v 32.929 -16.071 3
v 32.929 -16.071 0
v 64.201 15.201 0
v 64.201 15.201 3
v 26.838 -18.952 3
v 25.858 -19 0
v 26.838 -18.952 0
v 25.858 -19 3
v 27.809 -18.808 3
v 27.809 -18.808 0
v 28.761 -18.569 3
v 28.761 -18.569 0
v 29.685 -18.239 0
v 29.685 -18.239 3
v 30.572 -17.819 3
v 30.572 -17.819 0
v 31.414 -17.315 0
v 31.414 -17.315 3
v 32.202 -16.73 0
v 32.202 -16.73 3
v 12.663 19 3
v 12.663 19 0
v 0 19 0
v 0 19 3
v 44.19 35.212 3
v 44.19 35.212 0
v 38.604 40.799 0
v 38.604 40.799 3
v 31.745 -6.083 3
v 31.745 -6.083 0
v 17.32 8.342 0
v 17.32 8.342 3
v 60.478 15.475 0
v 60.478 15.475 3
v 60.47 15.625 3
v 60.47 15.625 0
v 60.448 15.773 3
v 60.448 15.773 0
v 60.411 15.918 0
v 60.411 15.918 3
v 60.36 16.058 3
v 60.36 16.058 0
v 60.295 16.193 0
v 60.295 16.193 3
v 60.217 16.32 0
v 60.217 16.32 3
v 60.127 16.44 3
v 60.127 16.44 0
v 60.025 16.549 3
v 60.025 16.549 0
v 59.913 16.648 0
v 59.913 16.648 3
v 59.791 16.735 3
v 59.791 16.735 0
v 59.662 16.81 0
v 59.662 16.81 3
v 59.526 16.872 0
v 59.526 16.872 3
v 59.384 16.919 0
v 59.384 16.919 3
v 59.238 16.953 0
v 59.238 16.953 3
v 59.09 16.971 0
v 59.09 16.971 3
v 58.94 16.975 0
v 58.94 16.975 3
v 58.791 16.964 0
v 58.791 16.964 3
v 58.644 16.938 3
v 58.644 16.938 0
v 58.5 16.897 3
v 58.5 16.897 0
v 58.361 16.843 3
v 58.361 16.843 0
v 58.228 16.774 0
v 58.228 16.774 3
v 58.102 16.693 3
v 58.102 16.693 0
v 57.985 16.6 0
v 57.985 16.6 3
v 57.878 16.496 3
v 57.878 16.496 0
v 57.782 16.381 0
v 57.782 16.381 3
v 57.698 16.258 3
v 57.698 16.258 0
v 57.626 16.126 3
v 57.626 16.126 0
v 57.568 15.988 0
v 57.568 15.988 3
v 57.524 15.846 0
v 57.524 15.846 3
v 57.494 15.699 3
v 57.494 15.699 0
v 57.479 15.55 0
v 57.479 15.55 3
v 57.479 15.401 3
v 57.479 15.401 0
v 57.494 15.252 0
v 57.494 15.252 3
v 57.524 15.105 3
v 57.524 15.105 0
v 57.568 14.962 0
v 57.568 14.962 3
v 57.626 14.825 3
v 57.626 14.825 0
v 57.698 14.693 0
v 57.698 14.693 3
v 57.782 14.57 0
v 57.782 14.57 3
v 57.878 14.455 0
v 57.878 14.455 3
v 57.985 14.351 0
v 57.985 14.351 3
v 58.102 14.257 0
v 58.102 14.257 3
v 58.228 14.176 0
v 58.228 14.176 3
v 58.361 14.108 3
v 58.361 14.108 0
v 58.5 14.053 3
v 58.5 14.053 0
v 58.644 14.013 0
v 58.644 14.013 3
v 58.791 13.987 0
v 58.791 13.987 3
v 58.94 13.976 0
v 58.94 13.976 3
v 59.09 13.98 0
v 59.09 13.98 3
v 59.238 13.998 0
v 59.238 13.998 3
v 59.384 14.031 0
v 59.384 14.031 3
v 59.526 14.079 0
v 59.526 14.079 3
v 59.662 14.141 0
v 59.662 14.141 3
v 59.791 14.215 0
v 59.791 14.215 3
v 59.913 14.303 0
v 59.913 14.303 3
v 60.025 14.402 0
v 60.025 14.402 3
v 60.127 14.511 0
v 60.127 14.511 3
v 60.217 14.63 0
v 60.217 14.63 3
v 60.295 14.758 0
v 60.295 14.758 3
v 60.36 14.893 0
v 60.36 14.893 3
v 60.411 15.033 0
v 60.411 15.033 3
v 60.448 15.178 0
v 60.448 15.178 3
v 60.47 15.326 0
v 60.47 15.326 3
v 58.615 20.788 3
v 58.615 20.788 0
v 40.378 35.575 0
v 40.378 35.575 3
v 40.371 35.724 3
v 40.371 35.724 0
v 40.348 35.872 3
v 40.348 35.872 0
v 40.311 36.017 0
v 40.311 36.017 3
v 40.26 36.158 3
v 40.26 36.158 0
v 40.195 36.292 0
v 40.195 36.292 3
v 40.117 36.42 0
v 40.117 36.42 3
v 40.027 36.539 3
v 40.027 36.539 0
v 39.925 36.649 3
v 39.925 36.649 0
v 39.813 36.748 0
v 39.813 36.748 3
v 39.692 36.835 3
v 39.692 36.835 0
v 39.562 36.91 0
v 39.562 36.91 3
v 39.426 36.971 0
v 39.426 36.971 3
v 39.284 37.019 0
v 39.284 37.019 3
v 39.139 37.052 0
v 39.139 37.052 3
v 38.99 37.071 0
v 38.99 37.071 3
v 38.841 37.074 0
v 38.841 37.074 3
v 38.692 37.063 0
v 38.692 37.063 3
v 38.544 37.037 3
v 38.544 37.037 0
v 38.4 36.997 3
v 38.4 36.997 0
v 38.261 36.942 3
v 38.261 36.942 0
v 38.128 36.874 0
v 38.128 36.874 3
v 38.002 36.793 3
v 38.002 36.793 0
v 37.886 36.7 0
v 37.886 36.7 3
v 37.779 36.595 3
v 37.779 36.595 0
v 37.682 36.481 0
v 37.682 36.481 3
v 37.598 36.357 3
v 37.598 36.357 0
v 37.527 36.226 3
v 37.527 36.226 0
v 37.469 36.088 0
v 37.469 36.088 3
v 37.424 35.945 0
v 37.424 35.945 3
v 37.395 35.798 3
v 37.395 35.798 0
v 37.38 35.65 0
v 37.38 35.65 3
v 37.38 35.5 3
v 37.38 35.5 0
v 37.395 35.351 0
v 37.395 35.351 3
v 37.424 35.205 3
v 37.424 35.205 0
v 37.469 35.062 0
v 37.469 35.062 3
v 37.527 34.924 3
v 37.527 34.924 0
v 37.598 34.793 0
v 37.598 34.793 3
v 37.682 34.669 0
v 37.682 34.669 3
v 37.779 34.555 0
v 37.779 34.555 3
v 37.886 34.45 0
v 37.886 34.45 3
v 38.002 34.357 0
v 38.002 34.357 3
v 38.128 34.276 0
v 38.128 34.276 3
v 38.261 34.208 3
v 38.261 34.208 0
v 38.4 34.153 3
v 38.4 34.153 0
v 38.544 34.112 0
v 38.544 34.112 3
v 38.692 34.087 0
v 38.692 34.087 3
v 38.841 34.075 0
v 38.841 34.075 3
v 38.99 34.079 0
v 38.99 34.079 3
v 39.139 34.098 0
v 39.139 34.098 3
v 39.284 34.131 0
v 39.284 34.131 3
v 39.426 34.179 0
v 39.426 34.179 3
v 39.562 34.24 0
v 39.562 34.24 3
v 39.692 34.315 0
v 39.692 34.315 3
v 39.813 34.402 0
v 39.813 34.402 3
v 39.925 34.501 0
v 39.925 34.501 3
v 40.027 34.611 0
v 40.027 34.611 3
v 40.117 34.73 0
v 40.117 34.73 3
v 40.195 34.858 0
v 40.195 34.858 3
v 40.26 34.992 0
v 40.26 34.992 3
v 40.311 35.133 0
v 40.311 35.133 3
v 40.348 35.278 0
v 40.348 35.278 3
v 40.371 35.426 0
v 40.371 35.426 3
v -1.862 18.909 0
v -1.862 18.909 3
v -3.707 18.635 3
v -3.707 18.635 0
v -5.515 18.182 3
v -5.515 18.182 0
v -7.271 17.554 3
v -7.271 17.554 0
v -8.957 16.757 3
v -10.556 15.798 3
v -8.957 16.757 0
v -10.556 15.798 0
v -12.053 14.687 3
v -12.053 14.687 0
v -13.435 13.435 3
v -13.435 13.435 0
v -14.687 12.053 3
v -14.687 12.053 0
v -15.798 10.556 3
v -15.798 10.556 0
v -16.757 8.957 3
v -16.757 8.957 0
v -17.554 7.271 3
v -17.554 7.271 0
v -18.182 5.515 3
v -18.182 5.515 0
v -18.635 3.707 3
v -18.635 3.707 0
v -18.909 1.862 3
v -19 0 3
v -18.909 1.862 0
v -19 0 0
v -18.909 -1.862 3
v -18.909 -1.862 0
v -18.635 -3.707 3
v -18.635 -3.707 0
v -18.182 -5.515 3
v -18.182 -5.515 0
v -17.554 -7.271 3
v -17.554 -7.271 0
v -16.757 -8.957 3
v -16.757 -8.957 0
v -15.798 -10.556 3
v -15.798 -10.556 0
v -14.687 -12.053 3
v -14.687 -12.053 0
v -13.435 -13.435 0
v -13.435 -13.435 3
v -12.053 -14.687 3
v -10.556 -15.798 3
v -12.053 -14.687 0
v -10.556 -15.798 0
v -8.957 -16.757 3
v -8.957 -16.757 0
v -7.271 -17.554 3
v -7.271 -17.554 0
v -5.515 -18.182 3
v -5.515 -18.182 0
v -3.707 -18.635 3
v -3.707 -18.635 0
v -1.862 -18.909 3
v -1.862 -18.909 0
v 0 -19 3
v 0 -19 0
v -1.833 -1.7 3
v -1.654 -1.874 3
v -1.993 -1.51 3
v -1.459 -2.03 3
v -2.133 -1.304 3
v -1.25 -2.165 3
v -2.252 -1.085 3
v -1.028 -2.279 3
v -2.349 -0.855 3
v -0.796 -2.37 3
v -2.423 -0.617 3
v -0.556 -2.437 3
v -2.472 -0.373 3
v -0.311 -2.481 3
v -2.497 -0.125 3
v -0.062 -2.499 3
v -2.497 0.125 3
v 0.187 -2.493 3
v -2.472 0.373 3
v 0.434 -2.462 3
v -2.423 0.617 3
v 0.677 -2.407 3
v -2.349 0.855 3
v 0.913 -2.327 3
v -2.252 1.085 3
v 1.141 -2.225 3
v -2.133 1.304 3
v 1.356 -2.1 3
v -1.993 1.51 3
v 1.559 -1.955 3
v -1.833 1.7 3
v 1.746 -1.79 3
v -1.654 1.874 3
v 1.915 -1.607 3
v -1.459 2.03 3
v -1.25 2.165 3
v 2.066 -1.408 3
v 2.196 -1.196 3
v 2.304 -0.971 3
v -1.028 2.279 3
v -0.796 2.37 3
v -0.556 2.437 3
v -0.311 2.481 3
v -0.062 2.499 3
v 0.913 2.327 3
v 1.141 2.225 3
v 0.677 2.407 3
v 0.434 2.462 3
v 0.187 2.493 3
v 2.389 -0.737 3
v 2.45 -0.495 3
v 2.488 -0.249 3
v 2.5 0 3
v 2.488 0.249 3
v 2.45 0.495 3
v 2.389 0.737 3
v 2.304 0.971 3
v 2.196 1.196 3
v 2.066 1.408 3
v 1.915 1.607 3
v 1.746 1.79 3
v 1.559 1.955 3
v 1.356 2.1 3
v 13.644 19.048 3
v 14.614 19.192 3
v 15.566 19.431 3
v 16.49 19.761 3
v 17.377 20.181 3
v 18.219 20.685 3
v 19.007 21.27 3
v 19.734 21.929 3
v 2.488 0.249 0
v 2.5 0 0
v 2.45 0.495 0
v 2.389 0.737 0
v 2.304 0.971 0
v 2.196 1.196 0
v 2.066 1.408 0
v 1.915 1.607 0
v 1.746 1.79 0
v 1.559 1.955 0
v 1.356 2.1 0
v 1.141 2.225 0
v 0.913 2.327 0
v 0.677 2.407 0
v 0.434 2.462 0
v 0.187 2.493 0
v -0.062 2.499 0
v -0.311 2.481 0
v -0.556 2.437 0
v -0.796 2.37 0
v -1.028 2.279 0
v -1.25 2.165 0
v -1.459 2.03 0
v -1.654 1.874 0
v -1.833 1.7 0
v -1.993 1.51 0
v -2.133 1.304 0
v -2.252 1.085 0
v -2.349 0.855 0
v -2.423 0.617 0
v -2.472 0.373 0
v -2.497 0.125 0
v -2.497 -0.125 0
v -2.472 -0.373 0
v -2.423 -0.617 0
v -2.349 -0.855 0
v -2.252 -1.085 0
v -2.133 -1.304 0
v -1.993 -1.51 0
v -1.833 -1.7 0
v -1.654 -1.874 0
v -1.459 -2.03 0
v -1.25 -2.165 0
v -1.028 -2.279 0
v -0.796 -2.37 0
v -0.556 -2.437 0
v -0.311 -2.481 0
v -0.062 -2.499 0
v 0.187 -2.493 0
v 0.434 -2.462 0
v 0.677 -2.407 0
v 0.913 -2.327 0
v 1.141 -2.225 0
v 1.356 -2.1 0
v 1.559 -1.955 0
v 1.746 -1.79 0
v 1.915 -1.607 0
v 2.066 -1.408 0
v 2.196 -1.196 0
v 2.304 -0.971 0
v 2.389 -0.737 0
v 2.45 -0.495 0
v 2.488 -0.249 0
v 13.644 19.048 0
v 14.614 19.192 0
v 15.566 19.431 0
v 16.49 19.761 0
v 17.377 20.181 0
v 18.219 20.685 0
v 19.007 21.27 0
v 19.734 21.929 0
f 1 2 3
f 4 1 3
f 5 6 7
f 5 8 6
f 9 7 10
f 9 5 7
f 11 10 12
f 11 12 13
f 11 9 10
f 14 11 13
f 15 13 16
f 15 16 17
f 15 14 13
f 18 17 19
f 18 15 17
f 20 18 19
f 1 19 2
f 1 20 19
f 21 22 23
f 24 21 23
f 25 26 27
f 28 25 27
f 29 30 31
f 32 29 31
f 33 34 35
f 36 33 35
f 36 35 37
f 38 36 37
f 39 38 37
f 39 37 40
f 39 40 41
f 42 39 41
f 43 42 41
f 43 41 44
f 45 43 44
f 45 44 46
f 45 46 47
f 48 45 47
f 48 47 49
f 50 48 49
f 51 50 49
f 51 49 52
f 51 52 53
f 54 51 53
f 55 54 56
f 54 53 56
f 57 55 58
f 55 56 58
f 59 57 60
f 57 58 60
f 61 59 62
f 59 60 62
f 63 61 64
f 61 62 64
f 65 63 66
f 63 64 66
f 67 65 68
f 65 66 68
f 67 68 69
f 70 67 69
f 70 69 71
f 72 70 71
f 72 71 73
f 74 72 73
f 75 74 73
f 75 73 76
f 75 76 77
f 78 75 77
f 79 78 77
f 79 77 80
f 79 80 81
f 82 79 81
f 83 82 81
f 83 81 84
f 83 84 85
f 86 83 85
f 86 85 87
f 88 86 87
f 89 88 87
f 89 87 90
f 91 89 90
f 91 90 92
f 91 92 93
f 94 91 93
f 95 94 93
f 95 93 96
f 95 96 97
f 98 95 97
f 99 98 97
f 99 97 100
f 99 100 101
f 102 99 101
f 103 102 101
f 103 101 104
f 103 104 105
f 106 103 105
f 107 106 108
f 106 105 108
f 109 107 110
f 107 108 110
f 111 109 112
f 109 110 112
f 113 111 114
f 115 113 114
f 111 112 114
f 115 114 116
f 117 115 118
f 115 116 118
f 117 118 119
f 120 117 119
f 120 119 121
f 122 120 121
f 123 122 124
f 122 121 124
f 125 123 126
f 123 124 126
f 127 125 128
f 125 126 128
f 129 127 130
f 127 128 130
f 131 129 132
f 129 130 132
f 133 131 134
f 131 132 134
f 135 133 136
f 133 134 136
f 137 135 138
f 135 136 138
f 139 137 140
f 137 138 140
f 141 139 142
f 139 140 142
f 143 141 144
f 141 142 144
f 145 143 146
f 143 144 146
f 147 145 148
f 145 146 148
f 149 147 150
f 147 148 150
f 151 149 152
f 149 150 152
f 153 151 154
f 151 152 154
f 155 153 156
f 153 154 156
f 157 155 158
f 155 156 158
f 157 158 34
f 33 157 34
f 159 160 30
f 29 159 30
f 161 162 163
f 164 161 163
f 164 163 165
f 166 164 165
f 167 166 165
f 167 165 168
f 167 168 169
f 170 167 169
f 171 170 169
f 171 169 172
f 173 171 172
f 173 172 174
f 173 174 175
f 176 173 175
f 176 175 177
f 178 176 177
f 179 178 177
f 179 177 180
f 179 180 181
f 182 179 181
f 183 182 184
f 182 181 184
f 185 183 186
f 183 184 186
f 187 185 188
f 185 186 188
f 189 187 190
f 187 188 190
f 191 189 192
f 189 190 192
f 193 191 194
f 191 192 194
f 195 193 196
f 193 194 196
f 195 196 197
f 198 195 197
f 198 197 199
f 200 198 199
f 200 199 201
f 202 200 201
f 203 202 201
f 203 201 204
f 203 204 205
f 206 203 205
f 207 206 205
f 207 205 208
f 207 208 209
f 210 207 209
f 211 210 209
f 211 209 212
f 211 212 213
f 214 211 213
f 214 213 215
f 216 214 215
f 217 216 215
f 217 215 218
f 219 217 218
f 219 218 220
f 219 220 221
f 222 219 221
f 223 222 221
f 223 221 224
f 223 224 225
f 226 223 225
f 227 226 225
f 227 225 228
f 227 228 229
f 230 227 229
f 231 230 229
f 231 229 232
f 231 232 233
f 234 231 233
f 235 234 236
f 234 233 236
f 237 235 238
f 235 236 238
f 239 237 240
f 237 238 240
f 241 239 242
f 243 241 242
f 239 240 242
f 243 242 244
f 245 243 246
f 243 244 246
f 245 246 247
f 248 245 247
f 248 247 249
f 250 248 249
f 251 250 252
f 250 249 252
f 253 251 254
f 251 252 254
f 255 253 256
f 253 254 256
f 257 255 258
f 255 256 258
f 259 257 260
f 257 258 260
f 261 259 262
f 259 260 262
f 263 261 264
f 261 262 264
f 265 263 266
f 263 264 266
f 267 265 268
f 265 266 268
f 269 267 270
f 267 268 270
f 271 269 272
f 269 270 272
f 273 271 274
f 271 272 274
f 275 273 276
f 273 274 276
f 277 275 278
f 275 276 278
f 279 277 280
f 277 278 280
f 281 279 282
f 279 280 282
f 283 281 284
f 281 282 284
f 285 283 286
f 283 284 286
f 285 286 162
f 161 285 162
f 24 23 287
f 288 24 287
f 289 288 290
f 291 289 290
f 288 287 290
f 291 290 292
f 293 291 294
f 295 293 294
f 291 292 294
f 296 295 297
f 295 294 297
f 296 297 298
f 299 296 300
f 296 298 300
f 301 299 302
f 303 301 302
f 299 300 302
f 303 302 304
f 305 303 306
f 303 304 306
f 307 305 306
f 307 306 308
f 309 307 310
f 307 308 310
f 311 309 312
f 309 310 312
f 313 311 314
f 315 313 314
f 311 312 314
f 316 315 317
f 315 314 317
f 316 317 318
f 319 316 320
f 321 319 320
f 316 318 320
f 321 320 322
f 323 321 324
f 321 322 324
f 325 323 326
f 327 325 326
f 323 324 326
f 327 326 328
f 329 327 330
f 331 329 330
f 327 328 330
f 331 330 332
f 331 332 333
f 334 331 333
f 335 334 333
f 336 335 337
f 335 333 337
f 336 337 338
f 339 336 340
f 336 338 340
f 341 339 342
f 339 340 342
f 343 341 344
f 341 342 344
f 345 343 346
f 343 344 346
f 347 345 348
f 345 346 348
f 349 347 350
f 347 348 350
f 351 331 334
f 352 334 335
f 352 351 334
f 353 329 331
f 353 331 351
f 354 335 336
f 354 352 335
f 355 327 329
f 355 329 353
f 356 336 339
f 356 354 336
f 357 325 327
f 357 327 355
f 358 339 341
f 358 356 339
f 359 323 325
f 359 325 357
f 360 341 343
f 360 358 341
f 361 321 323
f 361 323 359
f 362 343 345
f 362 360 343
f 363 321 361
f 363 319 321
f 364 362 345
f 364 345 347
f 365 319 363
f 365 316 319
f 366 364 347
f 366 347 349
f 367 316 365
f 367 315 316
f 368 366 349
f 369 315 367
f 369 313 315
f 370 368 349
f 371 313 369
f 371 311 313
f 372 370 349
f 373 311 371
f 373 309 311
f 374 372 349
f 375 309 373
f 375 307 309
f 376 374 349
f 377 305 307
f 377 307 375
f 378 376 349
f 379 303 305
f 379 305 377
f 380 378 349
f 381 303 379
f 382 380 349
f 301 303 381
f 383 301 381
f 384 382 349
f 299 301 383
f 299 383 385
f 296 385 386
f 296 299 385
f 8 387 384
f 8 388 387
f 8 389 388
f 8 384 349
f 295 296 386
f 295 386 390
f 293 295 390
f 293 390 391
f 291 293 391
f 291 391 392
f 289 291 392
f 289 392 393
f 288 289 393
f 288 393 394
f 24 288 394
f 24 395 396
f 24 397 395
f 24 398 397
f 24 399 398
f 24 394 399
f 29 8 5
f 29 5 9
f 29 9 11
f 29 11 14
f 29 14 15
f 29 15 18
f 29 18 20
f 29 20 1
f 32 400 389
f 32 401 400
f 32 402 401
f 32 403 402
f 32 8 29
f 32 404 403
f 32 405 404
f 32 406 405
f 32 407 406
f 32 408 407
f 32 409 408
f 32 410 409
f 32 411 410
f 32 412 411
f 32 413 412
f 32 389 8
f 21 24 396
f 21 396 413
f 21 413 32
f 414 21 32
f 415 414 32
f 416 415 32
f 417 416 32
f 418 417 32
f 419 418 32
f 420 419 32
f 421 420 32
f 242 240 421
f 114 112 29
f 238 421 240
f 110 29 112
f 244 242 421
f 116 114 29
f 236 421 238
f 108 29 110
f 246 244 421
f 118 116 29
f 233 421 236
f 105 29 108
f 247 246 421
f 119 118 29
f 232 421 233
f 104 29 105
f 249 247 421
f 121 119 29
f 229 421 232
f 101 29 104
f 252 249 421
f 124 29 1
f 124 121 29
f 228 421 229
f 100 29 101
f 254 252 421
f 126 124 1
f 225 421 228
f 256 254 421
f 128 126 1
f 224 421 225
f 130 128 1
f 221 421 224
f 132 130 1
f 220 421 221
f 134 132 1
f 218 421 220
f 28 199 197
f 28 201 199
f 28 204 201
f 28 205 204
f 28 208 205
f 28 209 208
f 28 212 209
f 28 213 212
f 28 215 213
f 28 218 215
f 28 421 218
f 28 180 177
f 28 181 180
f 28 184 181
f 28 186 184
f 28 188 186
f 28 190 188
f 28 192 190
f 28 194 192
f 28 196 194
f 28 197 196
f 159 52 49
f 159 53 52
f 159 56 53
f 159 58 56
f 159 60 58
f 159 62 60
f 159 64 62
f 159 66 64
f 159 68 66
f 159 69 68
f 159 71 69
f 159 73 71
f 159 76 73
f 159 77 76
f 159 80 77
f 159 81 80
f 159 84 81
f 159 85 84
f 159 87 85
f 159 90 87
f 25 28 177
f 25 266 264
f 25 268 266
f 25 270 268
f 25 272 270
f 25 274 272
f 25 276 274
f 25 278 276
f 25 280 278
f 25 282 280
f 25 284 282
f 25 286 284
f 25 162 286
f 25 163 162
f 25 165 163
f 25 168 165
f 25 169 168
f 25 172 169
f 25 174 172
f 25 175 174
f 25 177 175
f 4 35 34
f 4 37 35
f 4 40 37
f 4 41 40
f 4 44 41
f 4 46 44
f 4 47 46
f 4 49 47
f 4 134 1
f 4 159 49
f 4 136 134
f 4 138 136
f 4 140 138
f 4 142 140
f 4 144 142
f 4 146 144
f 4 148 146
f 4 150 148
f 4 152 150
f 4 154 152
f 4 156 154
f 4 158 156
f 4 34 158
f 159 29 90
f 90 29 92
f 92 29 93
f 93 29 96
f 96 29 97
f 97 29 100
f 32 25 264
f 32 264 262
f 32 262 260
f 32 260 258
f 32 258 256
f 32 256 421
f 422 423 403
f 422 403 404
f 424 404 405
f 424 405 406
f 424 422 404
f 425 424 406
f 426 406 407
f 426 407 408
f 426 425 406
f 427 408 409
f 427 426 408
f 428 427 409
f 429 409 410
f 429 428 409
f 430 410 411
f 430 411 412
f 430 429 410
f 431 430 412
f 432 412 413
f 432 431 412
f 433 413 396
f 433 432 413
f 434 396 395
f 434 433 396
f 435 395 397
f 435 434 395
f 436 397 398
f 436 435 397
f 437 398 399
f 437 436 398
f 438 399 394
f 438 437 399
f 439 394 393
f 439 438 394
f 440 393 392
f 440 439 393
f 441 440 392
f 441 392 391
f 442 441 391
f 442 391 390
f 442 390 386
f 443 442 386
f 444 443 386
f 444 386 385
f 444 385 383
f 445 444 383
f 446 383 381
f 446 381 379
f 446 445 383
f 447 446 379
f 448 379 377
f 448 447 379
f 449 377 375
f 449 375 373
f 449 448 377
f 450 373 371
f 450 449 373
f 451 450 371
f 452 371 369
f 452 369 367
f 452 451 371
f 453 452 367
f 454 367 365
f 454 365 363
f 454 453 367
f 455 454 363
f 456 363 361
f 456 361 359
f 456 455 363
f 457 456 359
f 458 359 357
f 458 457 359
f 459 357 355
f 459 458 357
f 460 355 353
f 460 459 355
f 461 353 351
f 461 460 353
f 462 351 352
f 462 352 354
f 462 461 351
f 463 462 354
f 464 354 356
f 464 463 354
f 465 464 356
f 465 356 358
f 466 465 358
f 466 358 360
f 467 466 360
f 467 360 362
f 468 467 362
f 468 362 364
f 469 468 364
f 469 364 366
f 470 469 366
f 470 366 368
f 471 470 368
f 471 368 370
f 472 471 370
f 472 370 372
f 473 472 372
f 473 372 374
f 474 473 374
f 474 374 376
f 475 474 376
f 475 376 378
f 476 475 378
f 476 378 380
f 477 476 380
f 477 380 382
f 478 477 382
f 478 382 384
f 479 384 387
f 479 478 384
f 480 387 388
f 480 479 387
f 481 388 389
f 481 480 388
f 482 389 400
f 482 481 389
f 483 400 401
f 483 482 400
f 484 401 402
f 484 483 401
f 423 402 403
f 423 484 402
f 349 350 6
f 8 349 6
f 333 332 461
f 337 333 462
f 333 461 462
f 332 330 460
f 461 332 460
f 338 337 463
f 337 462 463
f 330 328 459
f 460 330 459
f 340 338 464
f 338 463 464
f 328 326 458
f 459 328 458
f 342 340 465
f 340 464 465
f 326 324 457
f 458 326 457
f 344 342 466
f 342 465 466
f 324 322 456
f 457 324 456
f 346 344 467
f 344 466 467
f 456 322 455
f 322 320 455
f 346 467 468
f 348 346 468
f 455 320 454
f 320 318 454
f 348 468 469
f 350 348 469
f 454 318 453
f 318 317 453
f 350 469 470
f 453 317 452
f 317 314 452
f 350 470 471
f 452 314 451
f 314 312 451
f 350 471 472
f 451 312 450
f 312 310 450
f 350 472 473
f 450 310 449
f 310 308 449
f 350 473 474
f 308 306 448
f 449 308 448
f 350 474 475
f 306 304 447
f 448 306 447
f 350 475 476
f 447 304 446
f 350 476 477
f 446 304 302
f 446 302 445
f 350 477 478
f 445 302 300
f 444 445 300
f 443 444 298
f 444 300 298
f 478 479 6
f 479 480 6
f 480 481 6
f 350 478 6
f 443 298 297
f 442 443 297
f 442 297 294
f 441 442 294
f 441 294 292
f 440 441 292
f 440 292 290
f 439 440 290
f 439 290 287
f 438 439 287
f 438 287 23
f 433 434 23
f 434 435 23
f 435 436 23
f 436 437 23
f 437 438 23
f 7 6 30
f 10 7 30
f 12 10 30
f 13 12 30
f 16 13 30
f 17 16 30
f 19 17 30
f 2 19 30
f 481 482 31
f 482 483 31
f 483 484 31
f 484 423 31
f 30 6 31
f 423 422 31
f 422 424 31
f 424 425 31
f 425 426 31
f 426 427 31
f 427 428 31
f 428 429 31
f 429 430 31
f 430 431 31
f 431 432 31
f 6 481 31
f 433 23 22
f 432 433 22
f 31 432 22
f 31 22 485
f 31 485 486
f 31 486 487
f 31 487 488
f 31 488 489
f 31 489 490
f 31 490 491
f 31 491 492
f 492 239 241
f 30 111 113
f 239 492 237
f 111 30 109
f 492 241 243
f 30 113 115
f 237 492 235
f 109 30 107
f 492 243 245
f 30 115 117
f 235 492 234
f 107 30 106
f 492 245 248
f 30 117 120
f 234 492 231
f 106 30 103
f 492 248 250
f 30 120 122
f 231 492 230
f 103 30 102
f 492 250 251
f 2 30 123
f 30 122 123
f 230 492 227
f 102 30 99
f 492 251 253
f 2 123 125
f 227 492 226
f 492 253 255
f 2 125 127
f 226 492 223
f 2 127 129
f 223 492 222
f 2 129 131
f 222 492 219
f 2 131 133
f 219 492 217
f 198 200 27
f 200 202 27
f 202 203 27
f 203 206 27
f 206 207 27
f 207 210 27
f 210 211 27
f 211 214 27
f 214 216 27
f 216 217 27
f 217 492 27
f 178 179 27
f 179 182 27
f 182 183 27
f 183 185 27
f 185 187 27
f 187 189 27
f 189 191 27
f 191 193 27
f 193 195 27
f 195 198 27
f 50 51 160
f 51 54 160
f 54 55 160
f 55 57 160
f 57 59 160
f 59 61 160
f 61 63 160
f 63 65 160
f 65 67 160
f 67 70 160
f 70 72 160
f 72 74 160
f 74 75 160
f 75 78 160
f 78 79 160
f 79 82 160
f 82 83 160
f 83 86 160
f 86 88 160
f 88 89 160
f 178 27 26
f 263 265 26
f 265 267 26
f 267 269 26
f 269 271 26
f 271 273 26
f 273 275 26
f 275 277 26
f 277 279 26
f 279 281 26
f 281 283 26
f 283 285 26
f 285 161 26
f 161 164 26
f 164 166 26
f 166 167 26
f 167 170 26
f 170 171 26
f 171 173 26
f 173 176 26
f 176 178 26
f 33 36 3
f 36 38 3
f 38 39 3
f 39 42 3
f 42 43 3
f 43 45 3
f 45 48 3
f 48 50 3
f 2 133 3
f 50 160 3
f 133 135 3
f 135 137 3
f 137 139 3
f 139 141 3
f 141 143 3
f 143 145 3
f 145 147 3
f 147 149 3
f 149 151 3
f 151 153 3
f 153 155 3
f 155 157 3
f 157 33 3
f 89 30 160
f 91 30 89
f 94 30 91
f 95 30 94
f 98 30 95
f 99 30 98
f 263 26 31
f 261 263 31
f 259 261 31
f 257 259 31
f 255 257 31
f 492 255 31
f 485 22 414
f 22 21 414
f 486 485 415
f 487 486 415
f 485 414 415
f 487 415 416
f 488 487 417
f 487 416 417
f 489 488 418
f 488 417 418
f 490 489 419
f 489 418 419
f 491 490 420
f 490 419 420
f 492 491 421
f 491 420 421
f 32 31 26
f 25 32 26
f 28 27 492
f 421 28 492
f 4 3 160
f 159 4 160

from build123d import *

# Parameters (mm, degrees)
SKETCH1_R           = 2.5
BOSS_EXTRUDE1_DEPTH = 3
SKETCH2_R           = 1.5
CUT_EXTRUDE1_DEPTH  = 77.127156728
FILLET1_R           = 10


with BuildPart() as part:
    # Sketch1 → Boss-Extrude1 (new body)
    with BuildSketch(Plane.XY):
        with BuildLine():
            Line((0, -19), (30, -19))
            Line((30, -19), (64.201367261, 15.201367261))
            Line((64.201367261, 15.201367261), (58.615223689, 20.787510832))
            Line((58.615223689, 20.787510832), (31.745166004, -6.082546853))
            Line((31.745166004, -6.082546853), (17.320187668, 8.342431483))
            Line((17.320187668, 8.342431483), (44.190245353, 35.212489168))
            Line((44.190245353, 35.212489168), (38.604101782, 40.798632739))
            Line((38.604101782, 40.798632739), (16.805469042, 19))
            Line((16.805469042, 19), (0, 19))
            ThreePointArc((0, 19), (-19, 0), (0, -19))
        make_face()
        Circle(SKETCH1_R, mode=Mode.SUBTRACT)
    extrude(amount=BOSS_EXTRUDE1_DEPTH)

    # Sketch2 → Cut-Extrude1 (cut, through all)
    with BuildSketch(Plane.XY.offset(3)):
        with Locations((38.878105659, 35.574881393)):
            Circle(SKETCH2_R)
        with Locations((58.977615915, 15.475371138)):
            Circle(SKETCH2_R)
    extrude(amount=-CUT_EXTRUDE1_DEPTH, mode=Mode.SUBTRACT)

    # Fillet1
    fillet1_edges = [part.edges().sort_by_distance(p)[0] for p in [
        (30, -19, 1.5),
        (16.805469042, 19, 1.5),
    ]]
    fillet(fillet1_edges, radius=FILLET1_R)


solid = part.part
